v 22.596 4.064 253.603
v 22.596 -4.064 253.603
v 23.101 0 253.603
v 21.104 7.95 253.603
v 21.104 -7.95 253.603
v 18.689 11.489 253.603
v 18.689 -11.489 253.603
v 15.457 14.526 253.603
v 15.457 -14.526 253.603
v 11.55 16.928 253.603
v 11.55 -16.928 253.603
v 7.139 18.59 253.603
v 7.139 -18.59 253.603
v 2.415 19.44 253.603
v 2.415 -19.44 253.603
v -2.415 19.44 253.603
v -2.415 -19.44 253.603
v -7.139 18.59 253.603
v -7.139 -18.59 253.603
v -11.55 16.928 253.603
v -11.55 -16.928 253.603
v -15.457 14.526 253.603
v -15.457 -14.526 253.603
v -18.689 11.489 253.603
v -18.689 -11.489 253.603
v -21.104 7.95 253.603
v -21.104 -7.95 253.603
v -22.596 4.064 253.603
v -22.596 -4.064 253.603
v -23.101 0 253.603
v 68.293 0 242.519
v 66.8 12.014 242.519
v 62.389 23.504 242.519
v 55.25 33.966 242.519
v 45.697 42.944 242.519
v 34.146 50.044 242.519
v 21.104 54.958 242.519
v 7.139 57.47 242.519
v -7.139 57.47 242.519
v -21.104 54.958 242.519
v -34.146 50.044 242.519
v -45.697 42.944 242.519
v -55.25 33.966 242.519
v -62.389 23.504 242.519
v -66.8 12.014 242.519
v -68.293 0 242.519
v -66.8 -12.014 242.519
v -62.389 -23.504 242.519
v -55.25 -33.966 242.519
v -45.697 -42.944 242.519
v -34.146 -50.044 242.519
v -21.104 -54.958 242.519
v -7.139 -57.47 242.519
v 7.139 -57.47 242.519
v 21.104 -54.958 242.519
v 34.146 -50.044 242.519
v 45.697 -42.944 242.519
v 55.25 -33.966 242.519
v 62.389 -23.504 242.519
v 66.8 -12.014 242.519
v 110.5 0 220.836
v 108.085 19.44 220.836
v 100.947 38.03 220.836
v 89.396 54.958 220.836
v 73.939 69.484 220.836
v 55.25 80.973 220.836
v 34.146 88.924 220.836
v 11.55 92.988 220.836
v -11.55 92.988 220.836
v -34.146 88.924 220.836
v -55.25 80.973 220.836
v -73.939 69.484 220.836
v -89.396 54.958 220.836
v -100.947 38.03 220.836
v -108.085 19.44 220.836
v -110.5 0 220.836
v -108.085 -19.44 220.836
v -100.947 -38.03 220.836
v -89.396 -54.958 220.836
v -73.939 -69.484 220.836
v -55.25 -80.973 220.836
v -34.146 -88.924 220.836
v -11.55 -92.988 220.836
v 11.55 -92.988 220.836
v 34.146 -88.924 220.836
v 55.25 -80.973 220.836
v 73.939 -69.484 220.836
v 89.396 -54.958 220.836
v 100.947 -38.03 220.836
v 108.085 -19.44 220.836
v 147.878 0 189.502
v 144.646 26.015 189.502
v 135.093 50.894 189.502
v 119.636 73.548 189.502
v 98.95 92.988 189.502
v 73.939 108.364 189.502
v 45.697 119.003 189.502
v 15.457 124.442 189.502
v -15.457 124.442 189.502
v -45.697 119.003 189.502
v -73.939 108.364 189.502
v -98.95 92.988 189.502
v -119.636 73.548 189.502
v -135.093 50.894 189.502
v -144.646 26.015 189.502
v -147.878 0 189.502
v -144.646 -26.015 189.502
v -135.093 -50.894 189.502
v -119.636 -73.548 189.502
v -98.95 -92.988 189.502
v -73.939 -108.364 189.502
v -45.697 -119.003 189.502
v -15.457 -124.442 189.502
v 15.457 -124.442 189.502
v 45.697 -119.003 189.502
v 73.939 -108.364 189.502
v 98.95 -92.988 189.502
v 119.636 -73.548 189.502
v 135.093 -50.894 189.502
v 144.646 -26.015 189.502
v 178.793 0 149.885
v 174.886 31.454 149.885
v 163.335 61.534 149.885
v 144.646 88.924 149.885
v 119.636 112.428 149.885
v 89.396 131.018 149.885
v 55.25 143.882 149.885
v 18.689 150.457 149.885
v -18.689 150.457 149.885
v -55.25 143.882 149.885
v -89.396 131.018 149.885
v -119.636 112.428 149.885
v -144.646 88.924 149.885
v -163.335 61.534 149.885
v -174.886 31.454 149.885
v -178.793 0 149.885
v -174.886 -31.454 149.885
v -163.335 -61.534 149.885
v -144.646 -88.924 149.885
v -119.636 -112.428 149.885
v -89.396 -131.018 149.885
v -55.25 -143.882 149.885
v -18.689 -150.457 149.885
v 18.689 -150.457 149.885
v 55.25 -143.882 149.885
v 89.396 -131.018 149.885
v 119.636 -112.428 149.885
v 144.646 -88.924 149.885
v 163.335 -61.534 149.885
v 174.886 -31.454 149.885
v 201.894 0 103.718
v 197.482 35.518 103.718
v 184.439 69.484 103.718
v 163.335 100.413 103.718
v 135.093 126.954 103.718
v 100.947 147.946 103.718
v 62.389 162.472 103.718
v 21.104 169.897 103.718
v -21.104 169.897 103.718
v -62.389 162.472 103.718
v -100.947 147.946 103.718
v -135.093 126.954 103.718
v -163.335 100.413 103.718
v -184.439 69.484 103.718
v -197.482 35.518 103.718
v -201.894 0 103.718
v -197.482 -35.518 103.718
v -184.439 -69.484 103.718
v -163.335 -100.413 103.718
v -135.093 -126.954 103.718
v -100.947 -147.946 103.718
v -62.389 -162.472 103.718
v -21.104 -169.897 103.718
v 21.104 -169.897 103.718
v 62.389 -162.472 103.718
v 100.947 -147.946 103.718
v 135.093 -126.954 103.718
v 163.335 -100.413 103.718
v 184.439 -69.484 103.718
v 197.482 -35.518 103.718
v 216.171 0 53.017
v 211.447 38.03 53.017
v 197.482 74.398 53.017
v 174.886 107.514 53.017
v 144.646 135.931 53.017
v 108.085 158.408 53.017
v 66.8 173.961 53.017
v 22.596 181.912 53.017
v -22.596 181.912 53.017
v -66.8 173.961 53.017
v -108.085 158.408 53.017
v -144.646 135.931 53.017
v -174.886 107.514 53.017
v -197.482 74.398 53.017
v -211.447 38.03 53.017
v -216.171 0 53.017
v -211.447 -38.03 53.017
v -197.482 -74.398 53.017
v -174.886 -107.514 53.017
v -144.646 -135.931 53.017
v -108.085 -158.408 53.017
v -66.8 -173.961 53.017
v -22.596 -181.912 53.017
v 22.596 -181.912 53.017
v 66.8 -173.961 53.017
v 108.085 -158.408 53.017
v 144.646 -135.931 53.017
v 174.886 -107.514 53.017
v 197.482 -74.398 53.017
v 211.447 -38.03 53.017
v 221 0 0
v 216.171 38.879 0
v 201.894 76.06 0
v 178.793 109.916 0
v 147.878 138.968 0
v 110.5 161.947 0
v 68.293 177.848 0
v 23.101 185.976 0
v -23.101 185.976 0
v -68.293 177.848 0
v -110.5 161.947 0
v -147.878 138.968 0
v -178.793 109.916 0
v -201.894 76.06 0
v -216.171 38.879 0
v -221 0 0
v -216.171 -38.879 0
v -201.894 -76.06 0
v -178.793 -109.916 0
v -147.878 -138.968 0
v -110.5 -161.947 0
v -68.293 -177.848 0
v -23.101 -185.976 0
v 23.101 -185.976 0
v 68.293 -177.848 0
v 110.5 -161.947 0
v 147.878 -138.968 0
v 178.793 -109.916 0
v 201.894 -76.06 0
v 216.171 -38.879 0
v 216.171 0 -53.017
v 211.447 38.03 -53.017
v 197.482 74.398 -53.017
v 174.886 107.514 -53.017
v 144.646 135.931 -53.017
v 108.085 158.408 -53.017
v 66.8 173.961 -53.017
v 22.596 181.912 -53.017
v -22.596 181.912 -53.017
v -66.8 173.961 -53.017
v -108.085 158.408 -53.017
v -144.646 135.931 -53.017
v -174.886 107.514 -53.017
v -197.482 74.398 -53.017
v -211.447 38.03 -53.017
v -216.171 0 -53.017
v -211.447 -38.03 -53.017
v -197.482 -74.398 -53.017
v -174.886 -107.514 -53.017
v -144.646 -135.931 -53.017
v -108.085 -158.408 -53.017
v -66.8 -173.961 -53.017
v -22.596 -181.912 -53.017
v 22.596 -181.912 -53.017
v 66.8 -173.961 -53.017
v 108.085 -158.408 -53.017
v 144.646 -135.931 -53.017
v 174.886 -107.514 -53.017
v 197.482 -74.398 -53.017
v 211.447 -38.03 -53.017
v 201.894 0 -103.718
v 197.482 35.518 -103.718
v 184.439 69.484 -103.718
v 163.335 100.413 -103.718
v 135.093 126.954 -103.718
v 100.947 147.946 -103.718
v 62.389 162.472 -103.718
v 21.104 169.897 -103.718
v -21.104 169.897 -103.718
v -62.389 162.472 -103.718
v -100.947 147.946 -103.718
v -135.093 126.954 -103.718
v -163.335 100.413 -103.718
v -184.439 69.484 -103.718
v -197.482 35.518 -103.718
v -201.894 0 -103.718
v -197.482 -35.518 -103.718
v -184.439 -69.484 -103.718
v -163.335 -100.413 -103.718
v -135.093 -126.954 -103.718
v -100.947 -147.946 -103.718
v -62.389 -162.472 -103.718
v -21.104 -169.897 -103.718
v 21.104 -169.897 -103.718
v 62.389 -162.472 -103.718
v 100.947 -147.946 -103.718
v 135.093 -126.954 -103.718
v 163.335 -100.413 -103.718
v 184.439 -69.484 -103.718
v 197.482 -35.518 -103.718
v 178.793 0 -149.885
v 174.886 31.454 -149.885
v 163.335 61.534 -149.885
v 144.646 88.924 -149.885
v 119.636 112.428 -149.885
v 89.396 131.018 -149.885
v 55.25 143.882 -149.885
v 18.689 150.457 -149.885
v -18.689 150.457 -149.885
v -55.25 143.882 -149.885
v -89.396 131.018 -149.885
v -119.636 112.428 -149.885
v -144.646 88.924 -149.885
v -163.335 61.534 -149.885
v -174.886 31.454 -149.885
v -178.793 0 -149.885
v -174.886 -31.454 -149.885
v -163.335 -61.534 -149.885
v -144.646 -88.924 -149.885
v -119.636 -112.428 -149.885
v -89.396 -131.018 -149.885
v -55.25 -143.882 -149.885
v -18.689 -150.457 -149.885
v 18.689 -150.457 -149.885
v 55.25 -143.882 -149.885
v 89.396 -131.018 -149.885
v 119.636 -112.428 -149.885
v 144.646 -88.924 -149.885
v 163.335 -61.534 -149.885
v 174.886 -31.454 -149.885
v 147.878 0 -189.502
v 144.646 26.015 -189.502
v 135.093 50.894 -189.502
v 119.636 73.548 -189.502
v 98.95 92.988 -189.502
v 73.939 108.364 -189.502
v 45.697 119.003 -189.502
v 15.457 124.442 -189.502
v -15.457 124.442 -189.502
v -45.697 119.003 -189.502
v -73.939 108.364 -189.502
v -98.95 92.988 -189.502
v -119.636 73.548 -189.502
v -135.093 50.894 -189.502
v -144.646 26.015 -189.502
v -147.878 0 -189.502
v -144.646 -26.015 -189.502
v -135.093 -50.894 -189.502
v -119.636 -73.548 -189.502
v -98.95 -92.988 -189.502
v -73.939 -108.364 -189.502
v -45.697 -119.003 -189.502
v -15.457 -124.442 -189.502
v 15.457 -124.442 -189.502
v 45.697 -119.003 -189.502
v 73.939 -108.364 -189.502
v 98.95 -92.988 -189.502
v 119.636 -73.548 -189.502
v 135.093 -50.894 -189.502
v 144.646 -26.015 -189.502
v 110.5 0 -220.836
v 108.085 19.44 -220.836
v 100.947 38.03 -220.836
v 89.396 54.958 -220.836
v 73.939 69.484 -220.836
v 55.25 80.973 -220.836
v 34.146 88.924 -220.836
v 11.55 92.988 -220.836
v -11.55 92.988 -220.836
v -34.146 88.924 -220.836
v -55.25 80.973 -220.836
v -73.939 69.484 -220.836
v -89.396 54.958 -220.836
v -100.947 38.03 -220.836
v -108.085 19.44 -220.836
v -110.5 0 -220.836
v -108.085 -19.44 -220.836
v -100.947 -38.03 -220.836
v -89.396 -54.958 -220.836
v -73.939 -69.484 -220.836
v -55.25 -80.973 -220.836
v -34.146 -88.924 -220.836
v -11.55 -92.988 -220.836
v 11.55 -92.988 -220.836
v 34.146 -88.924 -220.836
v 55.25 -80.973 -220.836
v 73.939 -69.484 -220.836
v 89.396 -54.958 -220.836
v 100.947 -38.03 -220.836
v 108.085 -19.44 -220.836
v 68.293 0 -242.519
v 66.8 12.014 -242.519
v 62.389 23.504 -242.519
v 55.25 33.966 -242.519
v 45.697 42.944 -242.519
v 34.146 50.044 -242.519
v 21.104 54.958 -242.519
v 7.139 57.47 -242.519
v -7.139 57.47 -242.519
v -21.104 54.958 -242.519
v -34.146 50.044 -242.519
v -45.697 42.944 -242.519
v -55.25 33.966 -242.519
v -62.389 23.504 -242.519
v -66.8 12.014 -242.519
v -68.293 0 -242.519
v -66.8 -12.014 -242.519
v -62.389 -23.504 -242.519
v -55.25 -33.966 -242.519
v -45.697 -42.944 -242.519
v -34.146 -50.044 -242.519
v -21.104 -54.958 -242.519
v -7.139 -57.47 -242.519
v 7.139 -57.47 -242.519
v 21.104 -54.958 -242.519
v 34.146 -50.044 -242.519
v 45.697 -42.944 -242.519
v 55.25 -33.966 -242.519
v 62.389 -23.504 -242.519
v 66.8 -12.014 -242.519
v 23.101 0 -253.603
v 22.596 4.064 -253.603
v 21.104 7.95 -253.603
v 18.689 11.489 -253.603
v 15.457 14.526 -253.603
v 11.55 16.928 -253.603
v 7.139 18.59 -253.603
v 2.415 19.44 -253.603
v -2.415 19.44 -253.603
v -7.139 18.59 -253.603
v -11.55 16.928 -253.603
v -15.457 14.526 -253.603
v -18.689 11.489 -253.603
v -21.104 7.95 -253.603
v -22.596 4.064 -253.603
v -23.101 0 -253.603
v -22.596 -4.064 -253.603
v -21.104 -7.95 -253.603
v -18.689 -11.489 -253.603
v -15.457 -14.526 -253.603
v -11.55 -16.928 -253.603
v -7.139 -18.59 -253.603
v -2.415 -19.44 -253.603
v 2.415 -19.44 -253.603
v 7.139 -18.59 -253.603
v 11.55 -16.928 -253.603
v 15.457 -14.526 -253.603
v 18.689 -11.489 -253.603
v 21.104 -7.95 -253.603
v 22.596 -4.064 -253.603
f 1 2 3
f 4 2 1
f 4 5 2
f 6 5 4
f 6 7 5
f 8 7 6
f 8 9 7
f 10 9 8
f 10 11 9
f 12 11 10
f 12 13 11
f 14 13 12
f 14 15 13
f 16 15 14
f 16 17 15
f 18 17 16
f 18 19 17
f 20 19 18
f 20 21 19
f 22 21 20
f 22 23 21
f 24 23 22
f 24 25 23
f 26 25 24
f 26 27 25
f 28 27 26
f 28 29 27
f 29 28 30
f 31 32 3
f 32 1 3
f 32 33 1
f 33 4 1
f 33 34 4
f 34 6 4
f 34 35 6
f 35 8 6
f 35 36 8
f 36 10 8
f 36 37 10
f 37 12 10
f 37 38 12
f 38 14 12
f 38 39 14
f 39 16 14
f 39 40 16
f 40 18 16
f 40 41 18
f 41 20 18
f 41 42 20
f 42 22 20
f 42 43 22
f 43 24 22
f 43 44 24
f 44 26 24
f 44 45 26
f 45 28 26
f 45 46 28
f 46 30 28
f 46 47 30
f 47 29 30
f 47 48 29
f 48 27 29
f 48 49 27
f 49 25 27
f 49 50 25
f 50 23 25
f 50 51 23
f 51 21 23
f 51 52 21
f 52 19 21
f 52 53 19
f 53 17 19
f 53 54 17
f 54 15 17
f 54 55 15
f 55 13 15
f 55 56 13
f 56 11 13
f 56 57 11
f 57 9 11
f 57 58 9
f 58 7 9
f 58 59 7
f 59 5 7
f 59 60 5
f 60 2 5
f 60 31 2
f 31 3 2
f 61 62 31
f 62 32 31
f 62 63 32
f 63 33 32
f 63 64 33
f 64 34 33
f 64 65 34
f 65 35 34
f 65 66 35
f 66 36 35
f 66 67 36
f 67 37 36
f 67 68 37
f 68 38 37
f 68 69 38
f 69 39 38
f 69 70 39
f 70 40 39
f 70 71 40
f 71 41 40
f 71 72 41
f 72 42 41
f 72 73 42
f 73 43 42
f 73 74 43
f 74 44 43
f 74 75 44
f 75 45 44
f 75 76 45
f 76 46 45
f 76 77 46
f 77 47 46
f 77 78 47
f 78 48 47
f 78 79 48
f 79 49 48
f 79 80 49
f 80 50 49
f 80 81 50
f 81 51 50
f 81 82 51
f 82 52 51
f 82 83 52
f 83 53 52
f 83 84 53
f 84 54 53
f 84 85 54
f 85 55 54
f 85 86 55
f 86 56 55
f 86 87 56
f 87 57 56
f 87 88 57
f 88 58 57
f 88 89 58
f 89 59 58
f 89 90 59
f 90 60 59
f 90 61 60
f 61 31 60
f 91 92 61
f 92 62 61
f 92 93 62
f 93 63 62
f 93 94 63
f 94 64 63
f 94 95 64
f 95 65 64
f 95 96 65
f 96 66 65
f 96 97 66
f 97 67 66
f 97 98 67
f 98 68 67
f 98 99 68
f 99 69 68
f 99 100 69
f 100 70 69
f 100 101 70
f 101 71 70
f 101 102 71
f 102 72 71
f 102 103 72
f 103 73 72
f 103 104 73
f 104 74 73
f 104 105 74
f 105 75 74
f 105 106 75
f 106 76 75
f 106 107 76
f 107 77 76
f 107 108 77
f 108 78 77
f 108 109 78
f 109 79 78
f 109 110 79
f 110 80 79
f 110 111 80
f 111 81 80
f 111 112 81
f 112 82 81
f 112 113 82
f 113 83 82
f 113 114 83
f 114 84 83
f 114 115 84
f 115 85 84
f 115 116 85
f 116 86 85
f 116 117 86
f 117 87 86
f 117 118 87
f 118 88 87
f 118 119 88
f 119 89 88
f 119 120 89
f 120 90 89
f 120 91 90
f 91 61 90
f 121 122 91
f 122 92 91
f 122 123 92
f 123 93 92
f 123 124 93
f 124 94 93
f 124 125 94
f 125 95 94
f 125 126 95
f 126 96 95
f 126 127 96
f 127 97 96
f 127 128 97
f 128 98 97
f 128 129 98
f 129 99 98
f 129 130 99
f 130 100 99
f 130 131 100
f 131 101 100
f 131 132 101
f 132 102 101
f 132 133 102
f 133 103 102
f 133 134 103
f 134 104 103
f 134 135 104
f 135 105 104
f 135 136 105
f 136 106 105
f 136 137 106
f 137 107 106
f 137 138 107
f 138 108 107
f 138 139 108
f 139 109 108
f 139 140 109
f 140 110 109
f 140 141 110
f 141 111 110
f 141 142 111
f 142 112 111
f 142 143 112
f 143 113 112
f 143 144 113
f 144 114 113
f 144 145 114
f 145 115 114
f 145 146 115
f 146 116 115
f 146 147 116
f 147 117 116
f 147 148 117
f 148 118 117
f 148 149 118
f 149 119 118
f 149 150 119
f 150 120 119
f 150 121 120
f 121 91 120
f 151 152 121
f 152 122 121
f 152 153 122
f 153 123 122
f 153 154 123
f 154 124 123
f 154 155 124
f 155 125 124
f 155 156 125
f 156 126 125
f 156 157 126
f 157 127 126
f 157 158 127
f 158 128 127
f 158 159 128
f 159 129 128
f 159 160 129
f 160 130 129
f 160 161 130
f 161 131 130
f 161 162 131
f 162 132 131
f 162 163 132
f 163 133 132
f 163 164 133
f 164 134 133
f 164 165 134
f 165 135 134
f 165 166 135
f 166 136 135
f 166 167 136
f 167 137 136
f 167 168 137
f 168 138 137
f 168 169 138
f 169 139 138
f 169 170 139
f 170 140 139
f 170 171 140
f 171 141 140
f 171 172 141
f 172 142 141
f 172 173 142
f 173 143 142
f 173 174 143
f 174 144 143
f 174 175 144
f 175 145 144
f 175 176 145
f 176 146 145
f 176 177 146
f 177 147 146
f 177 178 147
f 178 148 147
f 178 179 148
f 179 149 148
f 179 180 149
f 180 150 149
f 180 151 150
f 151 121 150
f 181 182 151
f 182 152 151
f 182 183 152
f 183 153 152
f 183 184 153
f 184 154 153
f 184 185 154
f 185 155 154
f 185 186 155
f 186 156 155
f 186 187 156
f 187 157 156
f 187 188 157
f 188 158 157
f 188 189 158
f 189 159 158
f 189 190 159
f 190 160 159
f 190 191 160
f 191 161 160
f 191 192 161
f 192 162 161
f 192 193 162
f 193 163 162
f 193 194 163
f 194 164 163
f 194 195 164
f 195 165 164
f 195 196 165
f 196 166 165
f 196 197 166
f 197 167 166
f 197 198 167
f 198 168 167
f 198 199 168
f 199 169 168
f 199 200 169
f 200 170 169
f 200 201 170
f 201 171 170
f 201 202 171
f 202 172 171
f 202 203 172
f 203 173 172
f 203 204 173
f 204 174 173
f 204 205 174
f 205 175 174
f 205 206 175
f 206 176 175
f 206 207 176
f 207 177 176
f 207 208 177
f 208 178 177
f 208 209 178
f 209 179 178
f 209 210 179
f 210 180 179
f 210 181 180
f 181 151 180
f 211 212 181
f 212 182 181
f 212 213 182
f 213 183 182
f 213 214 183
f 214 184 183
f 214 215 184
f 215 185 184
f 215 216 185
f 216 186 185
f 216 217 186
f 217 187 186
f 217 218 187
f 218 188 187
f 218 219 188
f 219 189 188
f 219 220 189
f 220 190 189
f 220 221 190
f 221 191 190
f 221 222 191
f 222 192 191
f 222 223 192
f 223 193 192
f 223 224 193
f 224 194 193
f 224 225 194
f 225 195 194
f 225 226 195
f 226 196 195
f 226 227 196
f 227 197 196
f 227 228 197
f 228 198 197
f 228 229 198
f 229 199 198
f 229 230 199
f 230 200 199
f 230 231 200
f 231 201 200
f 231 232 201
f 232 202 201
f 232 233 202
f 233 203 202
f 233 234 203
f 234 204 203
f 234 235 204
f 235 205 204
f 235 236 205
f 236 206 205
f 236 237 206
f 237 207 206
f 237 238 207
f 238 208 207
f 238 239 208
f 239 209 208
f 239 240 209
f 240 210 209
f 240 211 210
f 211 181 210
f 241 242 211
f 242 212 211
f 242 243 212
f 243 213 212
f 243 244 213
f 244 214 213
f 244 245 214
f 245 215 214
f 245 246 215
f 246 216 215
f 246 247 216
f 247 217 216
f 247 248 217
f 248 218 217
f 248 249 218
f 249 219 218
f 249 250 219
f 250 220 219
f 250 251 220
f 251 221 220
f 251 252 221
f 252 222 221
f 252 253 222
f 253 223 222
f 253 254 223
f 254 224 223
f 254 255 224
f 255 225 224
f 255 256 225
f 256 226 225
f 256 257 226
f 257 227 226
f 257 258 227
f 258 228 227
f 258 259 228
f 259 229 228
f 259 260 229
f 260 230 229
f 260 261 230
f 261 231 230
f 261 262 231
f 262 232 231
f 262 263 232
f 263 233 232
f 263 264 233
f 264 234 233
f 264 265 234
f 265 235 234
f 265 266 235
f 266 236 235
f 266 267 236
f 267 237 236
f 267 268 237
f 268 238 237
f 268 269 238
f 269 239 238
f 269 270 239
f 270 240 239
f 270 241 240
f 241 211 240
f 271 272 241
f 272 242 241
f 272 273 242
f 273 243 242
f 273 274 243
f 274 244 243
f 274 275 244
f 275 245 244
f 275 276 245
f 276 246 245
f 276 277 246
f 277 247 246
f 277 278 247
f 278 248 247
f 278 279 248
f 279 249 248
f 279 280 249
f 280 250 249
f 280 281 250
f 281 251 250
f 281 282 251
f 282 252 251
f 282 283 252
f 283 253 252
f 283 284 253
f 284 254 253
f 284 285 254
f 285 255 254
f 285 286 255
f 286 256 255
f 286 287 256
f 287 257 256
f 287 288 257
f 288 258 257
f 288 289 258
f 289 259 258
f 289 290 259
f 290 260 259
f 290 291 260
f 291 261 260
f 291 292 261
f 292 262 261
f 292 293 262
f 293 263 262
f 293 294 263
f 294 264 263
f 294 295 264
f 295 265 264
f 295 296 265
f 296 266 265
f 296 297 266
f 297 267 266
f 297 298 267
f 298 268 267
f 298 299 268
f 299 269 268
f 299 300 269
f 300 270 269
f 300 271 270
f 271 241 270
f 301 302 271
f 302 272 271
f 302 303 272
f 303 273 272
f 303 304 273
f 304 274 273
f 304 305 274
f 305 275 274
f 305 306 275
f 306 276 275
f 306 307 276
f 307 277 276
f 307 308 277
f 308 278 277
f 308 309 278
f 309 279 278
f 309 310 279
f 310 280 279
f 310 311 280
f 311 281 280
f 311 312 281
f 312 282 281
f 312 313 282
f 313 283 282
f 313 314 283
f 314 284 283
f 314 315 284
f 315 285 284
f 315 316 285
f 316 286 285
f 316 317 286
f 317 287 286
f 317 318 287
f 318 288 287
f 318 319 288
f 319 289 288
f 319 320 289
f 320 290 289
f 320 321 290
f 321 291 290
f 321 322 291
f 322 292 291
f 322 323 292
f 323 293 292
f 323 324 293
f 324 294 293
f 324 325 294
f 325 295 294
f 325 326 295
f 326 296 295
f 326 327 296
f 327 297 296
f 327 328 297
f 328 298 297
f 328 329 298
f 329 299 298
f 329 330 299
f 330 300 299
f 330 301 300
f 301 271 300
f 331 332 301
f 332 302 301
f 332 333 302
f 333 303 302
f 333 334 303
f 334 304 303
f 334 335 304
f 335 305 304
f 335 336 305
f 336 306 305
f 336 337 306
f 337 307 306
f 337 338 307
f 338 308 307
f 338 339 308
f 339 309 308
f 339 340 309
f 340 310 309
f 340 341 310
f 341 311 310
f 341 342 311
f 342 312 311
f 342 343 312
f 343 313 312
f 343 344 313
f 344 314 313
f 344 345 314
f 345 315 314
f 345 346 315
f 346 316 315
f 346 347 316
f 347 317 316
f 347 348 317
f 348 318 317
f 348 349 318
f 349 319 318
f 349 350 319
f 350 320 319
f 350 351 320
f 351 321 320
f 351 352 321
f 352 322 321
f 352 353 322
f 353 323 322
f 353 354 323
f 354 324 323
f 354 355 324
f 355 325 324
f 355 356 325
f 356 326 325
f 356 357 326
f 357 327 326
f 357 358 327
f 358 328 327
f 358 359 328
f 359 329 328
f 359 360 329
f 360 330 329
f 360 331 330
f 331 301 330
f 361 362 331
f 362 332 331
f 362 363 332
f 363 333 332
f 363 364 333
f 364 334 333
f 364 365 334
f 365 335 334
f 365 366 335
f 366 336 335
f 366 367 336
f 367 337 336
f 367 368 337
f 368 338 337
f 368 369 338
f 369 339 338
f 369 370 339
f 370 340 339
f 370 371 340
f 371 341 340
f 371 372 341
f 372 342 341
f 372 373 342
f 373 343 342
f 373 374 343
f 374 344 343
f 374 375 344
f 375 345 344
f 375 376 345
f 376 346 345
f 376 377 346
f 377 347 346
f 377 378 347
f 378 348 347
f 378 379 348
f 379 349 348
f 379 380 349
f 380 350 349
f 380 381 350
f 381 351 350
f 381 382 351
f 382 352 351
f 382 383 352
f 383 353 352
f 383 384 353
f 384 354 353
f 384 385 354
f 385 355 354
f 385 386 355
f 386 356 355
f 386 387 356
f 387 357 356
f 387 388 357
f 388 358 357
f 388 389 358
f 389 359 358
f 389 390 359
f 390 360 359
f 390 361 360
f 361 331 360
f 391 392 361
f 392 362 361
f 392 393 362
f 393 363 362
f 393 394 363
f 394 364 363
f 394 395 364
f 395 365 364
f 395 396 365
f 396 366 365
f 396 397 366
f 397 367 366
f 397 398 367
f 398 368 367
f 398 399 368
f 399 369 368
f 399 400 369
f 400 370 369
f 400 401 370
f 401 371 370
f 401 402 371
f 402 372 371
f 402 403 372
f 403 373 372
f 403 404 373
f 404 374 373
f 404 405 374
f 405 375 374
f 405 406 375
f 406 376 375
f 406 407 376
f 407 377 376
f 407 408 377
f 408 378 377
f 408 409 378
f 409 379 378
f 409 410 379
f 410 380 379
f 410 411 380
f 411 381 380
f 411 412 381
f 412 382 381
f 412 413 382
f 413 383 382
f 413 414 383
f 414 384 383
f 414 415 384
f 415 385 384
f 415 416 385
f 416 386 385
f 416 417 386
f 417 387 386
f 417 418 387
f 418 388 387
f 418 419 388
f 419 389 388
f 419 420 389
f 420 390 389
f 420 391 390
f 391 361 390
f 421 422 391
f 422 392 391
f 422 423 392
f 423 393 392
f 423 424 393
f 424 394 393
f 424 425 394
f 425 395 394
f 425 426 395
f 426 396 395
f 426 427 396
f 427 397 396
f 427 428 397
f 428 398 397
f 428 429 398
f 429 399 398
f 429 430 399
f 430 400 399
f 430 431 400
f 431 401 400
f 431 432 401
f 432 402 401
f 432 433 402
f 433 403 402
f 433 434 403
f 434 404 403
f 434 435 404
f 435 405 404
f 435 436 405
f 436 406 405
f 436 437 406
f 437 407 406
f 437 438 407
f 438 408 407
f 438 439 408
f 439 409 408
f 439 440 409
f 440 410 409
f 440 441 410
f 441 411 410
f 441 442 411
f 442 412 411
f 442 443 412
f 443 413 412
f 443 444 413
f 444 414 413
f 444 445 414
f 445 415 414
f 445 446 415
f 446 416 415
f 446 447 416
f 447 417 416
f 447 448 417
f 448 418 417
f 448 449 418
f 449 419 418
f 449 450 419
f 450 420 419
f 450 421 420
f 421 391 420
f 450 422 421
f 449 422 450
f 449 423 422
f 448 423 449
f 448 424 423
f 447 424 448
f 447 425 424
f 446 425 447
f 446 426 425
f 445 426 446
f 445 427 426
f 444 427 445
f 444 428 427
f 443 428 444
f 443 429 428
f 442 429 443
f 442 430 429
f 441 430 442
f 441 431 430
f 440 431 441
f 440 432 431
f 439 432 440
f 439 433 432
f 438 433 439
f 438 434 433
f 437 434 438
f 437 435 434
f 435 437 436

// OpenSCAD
// Generated by SolidPython 1.0.1 on 2020-07-29 00:46:51


scale(v = [13, 11, 15]) {
	sphere(r = 17);
}
/***********************************************
*********      SolidPython code:      **********
************************************************
 
# import packages: SolidPython
from solid import *
from solid.utils import *
from itertools import chain, combinations, permutations


class Resize:

    def __init__(self, scad_file):
        self.scad_file = scad_file
        #self.scad_file = import_scad(scad_file)
        # cone/cylinder param:
        self.r1 = 0
        self.r2 = 0
        self.h = 0
        # rectangular prism param:
        self.w = 0
        self.l = 0
        # ellipse param:
        self.r = 0

    # import OpenScad code (file name corresponds to shape)


    # classify shape + parameters
    def assign(self, param1, param2, param3):
        if self.scad_file == 'cone.scad':
            self.r1 = param1
            self.r2 = param2
            self.h = param3
        elif self.scad_file == 'cylinder.scad':
            self.r1 = param1
            self.r2 = param2
            self.h = param3
        elif self.scad_file == 'rectangularPrism.scad':
            self.h = param1
            self.l = param2
            self.w = param3
        else:
            self.r = param1
            self.h = param2

    # resize parameters
    def iterate(self):
        x = range(3, 20, 2)
        i = 1
        if self.scad_file == 'cone.scad':
            tempList = list(permutations(x, 2))
            for temp in tempList:
                param1 = temp[0]
                param2 = temp[1]
                filepath = 'produced_scad_files/' + 'cone' + str(param1) + '_' + str(param2) + '_' + '.scad'
                scad_render_to_file(cylinder(h=param1, r1=param2, r2=0), filepath)

        elif self.scad_file == 'cylinder.scad':
            tempList = list(permutations(x, 3))
            for temp in tempList:
                param1 = temp[0]
                param2 = temp[1]
                filepath = 'produced_scad_files/' + 'cylinder' + str(param1) + '_' + str(param2) + '_' + '.scad'
                scad_render_to_file(cylinder(h=param1, r1=param2, r2=param2), filepath)

        elif self.scad_file == 'rectangularPrism.scad':
            tempList = list(permutations(x, 3))
            for temp in tempList:
                param1 = temp[0]
                param2 = temp[1]
                param3 = temp[2]
                filepath = 'produced_scad_files/' + 'rectangularPrism' + str(param1) + '_' + str(param2) + '_' + str(
                    param3) + '.scad'
                scad_render_to_file(cube(size=(param1, param2, param3)), filepath)

        elif self.scad_file == 'ellipse.scad':
            tempList = list(permutations(x, 4))
            for temp in tempList:
                param1 = temp[0]
                param2 = temp[1]
                param3 = temp[2]
                param4 = temp[3]
                filepath = 'produced_scad_files/' + 'ellipse' + str(param1) + '_' + str(param2) + '_' + str(param3) + '_' + str(param4) + '.scad'
                scad_render_to_file(scale([param1, param2, param3])(sphere(r=param4)), filepath)

    def render_to_scadfile(self):
        scad_render_to_file(scad, 'example.scad') 
 
************************************************/
